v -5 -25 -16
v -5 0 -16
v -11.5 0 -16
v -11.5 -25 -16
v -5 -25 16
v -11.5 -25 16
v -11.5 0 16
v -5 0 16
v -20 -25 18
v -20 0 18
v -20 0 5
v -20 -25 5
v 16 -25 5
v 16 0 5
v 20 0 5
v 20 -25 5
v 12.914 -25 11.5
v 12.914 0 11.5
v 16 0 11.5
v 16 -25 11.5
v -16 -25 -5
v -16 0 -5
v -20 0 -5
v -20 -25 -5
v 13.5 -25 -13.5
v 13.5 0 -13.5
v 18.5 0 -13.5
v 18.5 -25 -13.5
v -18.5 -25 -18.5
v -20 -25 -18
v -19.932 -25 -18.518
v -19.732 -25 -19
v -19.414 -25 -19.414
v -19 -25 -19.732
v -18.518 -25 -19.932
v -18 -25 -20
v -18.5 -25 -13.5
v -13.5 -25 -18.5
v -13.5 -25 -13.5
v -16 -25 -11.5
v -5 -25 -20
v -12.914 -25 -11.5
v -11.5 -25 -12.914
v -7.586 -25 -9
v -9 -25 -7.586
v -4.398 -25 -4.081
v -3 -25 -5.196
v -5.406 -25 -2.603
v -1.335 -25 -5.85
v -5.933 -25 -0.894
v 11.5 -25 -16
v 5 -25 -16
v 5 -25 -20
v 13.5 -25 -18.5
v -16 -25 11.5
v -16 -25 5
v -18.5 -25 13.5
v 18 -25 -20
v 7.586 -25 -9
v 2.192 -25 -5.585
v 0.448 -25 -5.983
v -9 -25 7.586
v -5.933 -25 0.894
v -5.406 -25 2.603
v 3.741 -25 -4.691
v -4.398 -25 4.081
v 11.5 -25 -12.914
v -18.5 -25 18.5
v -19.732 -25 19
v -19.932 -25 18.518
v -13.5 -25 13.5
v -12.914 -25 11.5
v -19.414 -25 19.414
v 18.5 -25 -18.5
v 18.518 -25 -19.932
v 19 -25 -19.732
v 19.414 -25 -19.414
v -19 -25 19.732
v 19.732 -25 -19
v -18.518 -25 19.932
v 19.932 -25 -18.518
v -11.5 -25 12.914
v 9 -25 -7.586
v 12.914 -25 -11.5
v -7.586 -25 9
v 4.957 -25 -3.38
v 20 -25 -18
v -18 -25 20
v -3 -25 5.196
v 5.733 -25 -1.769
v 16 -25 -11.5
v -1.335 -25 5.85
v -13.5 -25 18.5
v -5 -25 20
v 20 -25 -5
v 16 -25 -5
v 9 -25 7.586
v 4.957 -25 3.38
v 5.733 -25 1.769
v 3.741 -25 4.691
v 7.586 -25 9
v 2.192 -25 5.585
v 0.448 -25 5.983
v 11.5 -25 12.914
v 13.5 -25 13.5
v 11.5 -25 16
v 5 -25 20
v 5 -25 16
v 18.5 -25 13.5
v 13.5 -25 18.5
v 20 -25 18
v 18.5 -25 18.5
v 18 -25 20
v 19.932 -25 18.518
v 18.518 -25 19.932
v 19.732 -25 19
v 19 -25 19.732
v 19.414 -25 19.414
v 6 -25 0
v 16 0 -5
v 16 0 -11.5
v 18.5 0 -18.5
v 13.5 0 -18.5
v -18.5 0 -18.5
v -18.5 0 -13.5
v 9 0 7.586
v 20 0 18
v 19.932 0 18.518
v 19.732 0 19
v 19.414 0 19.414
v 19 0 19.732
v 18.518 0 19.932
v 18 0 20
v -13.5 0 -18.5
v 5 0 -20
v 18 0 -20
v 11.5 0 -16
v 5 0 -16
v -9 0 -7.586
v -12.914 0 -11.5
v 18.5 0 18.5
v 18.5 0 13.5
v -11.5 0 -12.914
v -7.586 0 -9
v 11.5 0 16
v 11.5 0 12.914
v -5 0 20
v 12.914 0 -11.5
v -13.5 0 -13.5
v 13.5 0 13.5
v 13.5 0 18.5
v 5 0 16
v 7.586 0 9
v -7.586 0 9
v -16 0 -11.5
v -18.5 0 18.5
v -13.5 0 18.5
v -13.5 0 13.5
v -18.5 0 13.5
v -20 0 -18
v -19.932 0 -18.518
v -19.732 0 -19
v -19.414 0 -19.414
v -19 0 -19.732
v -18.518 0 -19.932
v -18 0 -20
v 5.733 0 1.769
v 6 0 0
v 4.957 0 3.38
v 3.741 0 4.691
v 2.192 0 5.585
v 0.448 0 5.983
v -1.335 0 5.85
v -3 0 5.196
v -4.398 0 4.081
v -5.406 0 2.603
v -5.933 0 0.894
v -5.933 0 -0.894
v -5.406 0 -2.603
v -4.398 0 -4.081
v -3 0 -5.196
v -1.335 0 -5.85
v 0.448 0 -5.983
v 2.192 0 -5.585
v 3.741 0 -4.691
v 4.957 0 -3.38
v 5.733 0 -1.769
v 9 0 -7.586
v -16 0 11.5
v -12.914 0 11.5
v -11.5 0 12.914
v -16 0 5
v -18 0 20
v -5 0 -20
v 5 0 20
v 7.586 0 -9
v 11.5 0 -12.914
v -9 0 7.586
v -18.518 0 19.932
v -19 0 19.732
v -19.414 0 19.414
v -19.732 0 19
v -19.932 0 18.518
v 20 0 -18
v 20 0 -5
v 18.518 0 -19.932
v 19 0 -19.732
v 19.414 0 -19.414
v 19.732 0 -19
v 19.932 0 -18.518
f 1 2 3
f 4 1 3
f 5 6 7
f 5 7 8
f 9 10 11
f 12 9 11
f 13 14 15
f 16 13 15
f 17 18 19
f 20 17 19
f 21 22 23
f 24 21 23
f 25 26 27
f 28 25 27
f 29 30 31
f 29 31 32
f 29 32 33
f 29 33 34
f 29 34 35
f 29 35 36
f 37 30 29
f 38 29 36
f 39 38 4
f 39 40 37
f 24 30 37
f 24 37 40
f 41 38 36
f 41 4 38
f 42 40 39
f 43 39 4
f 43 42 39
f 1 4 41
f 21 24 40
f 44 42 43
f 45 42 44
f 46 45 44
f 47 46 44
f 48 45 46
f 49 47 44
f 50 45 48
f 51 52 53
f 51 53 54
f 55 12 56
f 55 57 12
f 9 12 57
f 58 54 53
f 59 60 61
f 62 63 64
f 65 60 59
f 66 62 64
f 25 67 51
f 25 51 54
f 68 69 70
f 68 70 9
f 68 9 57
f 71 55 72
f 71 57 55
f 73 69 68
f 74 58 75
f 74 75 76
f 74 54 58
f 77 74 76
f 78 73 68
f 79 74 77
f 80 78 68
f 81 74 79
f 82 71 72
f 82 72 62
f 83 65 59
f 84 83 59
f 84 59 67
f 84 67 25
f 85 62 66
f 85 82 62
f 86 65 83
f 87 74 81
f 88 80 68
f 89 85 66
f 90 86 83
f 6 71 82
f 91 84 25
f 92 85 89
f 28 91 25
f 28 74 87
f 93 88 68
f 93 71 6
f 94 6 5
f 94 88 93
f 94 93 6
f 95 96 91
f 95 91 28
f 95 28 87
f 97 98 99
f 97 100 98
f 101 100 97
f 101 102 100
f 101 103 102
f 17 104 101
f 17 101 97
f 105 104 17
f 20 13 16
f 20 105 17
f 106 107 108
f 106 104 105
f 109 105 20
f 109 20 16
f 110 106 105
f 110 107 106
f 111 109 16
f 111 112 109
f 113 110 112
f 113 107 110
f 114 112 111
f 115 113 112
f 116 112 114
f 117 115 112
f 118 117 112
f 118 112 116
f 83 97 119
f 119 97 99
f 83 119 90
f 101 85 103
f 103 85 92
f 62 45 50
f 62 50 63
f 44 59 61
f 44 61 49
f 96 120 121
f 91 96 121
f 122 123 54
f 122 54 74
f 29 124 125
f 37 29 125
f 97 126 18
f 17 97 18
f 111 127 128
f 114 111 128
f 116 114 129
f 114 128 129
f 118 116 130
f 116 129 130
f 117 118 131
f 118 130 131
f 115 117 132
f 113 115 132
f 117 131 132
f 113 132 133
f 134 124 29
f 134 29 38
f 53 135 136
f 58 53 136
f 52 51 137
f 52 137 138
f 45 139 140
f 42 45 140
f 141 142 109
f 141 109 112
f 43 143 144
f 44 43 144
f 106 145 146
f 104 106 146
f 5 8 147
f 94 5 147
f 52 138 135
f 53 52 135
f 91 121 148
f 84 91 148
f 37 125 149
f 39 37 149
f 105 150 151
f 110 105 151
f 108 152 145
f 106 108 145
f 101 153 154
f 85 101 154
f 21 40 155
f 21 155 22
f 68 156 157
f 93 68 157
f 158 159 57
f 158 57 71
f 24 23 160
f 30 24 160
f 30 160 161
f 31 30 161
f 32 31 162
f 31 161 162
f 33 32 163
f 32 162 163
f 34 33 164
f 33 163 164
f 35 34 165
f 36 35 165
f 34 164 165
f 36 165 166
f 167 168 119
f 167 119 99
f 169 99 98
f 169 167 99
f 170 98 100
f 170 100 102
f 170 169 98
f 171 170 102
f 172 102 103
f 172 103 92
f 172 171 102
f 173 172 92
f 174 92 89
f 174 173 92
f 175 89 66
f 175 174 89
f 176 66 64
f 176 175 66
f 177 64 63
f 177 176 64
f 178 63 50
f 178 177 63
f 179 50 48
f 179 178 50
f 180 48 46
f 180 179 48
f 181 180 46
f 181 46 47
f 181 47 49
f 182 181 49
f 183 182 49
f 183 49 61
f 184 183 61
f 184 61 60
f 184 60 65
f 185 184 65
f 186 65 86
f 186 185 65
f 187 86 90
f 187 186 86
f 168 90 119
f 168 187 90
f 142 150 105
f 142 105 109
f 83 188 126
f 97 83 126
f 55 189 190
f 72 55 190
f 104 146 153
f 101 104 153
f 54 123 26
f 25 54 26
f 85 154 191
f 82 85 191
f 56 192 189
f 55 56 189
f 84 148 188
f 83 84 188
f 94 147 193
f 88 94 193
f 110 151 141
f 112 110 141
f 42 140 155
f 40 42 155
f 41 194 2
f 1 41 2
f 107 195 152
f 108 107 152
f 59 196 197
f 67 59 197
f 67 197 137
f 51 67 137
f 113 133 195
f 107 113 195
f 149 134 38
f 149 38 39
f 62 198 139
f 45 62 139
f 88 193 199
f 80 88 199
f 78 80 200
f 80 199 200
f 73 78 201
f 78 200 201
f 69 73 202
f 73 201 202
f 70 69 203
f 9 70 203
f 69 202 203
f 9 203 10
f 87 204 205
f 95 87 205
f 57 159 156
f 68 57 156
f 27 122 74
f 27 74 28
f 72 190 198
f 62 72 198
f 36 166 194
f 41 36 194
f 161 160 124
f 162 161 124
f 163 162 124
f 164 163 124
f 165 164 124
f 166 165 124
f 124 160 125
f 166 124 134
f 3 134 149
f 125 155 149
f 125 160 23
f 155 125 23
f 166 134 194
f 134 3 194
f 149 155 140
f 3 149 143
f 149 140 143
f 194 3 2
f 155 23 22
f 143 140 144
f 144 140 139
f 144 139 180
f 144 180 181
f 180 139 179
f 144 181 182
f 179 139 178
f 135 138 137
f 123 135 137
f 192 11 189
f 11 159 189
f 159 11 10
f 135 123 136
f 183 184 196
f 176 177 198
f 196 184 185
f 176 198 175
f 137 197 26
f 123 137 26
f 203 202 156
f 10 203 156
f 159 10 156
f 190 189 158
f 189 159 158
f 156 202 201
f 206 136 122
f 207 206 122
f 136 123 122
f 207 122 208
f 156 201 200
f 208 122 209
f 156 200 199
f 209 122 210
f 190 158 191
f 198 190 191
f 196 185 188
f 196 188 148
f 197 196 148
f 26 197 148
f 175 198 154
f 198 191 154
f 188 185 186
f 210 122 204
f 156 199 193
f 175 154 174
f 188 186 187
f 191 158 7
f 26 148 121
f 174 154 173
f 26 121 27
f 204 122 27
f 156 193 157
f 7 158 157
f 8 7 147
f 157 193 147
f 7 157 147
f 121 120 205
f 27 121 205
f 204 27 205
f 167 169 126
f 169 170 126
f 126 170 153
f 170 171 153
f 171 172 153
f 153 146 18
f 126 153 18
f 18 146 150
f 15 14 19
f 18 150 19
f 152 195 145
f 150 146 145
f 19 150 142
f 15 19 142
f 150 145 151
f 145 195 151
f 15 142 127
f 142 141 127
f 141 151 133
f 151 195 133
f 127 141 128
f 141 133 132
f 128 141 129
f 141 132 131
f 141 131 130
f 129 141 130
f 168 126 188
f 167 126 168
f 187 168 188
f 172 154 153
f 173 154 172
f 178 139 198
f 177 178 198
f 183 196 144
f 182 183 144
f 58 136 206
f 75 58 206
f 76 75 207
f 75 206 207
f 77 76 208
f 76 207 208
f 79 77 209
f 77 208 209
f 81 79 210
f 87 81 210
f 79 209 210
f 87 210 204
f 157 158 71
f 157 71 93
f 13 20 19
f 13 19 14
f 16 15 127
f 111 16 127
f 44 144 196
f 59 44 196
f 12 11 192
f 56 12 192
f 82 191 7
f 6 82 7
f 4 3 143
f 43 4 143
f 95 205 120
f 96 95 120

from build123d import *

# Parameters (mm, degrees)
F0_W     = 5
F0_H     = 5
F0_R     = 6
F1_DEPTH = 25


with BuildPart() as f1:
    # F0 (on Front) → F1 (new body)
    with BuildSketch(Plane.XZ):
        with BuildLine():
            Line((5, -20), (18, -20))
            ThreePointArc((18, -20), (19.414214, -19.414214), (20, -18))
            Line((20, -18), (20, -5))
            Line((20, -5), (16, -5))
            Line((16, -5), (16, -11.5))
            Line((16, -11.5), (12.914214, -11.5))
            Line((12.914214, -11.5), (9, -7.585786))
            Line((9, -7.585786), (9, 0))
            Line((9, 0), (9, 7.585786))
            Line((9, 7.585786), (12.914214, 11.5))
            Line((12.914214, 11.5), (16, 11.5))
            Line((16, 11.5), (16, 5))
            Line((16, 5), (20, 5))
            Line((20, 5), (20, 18))
            ThreePointArc((20, 18), (19.414214, 19.414214), (18, 20))
            Line((18, 20), (5, 20))
            Line((5, 20), (5, 16))
            Line((5, 16), (11.5, 16))
            Line((11.5, 16), (11.5, 12.914214))
            Line((11.5, 12.914214), (7.585786, 9))
            Line((7.585786, 9), (0, 9))
            Line((0, 9), (-7.585786, 9))
            Line((-7.585786, 9), (-11.5, 12.914214))
            Line((-11.5, 12.914214), (-11.5, 16))
            Line((-11.5, 16), (-5, 16))
            Line((-5, 16), (-5, 20))
            Line((-5, 20), (-18, 20))
            ThreePointArc((-18, 20), (-19.414214, 19.414214), (-20, 18))
            Line((-20, 18), (-20, 5))
            Line((-20, 5), (-16, 5))
            Line((-16, 5), (-16, 11.5))
            Line((-16, 11.5), (-12.914214, 11.5))
            Line((-12.914214, 11.5), (-9, 7.585786))
            Line((-9, 7.585786), (-9, 0))
            Line((-9, 0), (-9, -7.585786))
            Line((-9, -7.585786), (-12.914214, -11.5))
            Line((-12.914214, -11.5), (-16, -11.5))
            Line((-16, -11.5), (-16, -5))
            Line((-16, -5), (-20, -5))
            Line((-20, -5), (-20, -18))
            ThreePointArc((-20, -18), (-19.414214, -19.414214), (-18, -20))
            Line((-18, -20), (-5, -20))
            Line((-5, -20), (-5, -16))
            Line((-5, -16), (-11.5, -16))
            Line((-11.5, -16), (-11.5, -12.914214))
            Line((-11.5, -12.914214), (-7.585786, -9))
            Line((-7.585786, -9), (0, -9))
            Line((0, -9), (7.585786, -9))
            Line((7.585786, -9), (11.5, -12.914214))
            Line((11.5, -12.914214), (11.5, -16))
            Line((11.5, -16), (5, -16))
            Line((5, -16), (5, -20))
        make_face()
        with Locations((-16, -16)):
            Rectangle(F0_W, F0_H, mode=Mode.SUBTRACT)
        with Locations((16, -16)):
            Rectangle(F0_W, F0_H, mode=Mode.SUBTRACT)
        with Locations((-16, 16)):
            Rectangle(F0_W, F0_H, mode=Mode.SUBTRACT)
        Circle(F0_R, mode=Mode.SUBTRACT)
        with Locations((16, 16)):
            Rectangle(F0_W, F0_H, mode=Mode.SUBTRACT)
    extrude(amount=F1_DEPTH)


solid = f1.part
